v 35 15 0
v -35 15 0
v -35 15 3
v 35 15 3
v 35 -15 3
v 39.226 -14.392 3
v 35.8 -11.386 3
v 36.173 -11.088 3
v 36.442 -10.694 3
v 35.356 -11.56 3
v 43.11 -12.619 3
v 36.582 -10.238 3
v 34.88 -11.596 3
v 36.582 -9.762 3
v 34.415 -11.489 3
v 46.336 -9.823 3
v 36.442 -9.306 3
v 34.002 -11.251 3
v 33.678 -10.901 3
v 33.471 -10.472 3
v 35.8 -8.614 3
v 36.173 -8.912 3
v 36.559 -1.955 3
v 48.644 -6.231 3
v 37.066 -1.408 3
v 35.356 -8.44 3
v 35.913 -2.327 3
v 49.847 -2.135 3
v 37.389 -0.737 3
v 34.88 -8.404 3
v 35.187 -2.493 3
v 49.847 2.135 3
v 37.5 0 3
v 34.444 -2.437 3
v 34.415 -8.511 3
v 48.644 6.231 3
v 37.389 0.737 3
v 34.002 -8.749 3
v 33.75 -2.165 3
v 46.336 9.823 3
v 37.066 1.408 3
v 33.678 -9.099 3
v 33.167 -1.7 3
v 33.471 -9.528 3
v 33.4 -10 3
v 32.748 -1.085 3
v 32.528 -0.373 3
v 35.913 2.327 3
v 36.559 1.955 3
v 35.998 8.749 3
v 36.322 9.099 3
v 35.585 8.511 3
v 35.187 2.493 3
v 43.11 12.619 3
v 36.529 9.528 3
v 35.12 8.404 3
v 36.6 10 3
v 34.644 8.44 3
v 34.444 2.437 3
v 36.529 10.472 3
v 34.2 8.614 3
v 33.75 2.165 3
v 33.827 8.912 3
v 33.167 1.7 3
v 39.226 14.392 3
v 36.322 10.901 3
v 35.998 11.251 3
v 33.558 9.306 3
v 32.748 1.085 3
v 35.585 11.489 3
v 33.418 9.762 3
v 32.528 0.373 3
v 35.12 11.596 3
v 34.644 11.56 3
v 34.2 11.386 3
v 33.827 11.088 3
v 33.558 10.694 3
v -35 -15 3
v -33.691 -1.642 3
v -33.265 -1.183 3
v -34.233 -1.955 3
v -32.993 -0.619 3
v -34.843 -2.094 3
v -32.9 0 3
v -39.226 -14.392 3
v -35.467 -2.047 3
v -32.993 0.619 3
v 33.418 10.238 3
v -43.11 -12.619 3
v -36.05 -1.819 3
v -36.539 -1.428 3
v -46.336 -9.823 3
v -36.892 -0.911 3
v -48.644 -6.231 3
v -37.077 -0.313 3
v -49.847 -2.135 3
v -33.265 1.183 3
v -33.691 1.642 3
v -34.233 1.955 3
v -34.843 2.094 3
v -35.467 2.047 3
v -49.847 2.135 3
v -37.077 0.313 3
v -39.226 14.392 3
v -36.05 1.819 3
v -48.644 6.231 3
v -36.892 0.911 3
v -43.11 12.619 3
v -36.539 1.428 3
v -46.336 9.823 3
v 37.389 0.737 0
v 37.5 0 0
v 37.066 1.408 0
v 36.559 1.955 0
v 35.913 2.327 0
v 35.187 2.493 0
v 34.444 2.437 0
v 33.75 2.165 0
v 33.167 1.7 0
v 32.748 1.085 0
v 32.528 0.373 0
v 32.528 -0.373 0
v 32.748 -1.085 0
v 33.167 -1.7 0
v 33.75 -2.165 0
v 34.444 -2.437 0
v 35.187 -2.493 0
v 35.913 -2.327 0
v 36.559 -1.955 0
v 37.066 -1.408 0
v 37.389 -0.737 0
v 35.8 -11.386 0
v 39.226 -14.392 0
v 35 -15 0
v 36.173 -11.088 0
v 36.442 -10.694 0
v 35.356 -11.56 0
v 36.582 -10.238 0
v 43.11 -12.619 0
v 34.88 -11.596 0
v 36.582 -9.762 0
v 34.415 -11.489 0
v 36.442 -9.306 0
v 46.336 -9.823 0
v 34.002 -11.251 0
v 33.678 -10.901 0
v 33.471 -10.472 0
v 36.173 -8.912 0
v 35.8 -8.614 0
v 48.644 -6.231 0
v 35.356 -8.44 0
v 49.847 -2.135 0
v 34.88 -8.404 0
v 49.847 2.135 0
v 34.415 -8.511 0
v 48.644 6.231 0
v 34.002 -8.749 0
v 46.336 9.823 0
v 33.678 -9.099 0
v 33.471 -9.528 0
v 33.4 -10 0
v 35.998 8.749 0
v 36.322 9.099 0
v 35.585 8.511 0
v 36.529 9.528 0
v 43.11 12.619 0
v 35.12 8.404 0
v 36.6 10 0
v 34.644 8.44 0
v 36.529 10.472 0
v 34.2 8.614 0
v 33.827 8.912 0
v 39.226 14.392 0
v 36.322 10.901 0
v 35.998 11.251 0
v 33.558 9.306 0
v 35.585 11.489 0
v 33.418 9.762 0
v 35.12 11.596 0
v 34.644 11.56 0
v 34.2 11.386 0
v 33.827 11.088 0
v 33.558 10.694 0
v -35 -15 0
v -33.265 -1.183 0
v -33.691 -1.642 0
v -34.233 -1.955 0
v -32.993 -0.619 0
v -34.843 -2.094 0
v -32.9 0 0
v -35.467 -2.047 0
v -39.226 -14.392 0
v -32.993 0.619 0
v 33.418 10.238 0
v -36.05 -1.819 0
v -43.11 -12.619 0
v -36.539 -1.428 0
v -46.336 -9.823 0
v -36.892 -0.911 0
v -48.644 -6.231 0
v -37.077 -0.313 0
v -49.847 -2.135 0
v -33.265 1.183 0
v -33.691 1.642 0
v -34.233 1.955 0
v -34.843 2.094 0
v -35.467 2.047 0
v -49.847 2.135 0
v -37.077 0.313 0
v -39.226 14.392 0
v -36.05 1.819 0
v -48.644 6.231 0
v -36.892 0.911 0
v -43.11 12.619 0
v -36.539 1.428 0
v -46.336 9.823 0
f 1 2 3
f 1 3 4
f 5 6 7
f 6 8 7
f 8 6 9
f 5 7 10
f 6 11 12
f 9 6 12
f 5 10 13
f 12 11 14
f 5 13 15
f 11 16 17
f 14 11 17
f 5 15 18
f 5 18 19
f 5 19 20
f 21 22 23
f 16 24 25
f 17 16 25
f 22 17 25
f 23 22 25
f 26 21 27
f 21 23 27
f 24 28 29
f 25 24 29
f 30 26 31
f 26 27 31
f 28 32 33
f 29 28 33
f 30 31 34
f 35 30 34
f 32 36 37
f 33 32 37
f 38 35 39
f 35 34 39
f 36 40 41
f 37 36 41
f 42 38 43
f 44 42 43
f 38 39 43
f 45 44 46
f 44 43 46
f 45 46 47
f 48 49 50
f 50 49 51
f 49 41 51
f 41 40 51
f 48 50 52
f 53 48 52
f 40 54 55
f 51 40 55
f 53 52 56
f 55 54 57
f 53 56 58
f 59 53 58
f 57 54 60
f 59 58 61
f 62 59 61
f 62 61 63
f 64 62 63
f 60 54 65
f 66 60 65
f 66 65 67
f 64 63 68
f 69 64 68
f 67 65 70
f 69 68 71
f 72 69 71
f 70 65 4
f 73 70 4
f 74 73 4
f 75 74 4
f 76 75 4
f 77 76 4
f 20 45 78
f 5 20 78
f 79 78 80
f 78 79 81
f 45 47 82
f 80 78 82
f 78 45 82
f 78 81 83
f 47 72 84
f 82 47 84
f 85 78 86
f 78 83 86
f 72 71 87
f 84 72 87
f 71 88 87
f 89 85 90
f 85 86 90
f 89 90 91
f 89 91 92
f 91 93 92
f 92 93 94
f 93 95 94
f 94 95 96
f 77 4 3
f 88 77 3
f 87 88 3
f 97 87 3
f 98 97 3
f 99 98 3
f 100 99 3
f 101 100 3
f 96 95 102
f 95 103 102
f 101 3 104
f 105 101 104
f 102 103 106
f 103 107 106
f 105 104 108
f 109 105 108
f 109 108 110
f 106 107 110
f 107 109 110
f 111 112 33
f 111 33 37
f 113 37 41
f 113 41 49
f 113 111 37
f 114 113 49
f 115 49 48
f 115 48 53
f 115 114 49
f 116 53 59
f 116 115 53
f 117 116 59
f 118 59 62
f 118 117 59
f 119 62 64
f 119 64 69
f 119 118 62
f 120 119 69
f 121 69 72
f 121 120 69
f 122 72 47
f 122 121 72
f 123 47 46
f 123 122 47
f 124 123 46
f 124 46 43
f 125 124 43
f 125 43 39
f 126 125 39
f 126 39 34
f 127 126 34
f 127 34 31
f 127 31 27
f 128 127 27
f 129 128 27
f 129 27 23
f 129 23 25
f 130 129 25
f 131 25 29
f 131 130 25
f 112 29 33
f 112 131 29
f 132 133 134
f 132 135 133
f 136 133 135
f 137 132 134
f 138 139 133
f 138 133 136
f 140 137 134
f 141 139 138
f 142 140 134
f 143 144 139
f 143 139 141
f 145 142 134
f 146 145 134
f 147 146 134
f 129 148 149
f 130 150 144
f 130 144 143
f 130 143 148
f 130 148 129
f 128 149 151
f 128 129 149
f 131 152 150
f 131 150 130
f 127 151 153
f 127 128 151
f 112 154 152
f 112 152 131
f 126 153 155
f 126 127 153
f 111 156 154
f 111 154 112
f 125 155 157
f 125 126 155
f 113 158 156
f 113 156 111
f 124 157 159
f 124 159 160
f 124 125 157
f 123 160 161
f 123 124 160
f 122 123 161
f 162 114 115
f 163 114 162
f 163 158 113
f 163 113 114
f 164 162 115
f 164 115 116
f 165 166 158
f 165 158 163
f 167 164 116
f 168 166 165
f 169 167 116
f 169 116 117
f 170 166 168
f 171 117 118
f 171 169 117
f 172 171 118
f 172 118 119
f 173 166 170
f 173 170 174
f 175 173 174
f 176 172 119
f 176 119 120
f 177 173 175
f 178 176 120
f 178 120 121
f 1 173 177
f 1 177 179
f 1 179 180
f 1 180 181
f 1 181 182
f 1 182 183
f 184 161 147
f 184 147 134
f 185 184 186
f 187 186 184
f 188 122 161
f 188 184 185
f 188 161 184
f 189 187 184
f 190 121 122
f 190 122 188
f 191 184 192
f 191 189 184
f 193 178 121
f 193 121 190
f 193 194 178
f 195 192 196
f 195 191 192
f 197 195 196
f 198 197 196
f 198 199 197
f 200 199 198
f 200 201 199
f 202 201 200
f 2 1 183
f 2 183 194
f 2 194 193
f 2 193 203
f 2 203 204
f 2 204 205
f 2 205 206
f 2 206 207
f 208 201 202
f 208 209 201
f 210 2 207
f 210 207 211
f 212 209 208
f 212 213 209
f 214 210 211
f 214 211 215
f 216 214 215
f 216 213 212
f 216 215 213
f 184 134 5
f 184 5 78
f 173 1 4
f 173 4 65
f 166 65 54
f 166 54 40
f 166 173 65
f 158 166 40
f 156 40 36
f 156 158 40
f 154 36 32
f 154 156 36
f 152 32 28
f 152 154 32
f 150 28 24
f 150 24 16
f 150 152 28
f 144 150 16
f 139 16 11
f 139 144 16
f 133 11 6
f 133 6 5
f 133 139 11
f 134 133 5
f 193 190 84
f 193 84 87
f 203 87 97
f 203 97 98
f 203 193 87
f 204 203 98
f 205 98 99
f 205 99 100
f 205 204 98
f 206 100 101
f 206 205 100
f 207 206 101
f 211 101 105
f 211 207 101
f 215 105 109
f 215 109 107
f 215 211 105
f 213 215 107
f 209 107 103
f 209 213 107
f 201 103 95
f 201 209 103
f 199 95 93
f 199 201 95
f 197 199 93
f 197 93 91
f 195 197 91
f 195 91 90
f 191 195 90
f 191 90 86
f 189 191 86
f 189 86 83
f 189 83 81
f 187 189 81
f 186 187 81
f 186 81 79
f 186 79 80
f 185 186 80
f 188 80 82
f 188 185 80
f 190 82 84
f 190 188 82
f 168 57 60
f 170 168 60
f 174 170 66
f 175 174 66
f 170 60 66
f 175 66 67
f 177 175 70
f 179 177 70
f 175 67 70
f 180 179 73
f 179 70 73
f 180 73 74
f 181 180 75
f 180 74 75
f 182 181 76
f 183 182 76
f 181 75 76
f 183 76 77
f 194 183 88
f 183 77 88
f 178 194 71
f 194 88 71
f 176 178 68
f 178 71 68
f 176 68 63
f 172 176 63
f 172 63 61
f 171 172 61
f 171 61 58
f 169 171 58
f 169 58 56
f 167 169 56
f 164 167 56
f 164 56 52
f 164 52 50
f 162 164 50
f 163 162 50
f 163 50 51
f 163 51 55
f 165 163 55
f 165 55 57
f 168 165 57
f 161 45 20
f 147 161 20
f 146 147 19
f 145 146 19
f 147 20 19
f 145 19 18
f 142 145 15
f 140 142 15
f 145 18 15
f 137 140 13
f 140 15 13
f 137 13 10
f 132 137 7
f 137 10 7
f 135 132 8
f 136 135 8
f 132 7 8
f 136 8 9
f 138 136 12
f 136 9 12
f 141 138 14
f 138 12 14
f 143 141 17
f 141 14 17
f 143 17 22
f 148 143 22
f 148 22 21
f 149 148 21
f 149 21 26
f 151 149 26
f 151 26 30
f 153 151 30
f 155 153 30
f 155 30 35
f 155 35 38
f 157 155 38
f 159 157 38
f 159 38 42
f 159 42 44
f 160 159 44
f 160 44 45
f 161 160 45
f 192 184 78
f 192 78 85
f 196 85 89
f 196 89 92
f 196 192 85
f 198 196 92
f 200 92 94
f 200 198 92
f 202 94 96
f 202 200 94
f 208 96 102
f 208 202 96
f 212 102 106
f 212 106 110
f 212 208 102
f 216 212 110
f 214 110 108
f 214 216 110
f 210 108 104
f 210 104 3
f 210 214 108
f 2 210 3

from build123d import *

# Parameters (mm, degrees)
ESQUISSE1_R             = 2.5
ESQUISSE1_R_2           = 2.1
BOSS_EXTRU_1_DEPTH      = 3
ESQUISSE2_R             = 1.6
ENL_V_MAT_EXTRU_1_DEPTH = 53.28766585


with BuildPart() as part:
    # Esquisse1 → Boss.-Extru.1 (new body)
    with BuildSketch(Plane.XY):
        with BuildLine():
            Line((-35, 15), (35, 15))
            ThreePointArc((35, 15), (50, 0), (35, -15))
            Line((35, -15), (-35, -15))
            ThreePointArc((-35, -15), (-50, 0), (-35, 15))
        make_face()
        with Locations((35, 0)):
            Circle(ESQUISSE1_R, mode=Mode.SUBTRACT)
        with Locations((-35, 0)):
            Circle(ESQUISSE1_R_2, mode=Mode.SUBTRACT)
    extrude(amount=BOSS_EXTRU_1_DEPTH)

    # Esquisse2 → Enlèv. mat.-Extru.1 (cut, through all)
    with BuildSketch(Plane.XY.offset(3)):
        with Locations((35, 10)):
            Circle(ESQUISSE2_R)
        with Locations(Location((35, -10, 0), (0, 0, 180))):
            Circle(ESQUISSE2_R)
    extrude(amount=-ENL_V_MAT_EXTRU_1_DEPTH, mode=Mode.SUBTRACT)


solid = part.part
